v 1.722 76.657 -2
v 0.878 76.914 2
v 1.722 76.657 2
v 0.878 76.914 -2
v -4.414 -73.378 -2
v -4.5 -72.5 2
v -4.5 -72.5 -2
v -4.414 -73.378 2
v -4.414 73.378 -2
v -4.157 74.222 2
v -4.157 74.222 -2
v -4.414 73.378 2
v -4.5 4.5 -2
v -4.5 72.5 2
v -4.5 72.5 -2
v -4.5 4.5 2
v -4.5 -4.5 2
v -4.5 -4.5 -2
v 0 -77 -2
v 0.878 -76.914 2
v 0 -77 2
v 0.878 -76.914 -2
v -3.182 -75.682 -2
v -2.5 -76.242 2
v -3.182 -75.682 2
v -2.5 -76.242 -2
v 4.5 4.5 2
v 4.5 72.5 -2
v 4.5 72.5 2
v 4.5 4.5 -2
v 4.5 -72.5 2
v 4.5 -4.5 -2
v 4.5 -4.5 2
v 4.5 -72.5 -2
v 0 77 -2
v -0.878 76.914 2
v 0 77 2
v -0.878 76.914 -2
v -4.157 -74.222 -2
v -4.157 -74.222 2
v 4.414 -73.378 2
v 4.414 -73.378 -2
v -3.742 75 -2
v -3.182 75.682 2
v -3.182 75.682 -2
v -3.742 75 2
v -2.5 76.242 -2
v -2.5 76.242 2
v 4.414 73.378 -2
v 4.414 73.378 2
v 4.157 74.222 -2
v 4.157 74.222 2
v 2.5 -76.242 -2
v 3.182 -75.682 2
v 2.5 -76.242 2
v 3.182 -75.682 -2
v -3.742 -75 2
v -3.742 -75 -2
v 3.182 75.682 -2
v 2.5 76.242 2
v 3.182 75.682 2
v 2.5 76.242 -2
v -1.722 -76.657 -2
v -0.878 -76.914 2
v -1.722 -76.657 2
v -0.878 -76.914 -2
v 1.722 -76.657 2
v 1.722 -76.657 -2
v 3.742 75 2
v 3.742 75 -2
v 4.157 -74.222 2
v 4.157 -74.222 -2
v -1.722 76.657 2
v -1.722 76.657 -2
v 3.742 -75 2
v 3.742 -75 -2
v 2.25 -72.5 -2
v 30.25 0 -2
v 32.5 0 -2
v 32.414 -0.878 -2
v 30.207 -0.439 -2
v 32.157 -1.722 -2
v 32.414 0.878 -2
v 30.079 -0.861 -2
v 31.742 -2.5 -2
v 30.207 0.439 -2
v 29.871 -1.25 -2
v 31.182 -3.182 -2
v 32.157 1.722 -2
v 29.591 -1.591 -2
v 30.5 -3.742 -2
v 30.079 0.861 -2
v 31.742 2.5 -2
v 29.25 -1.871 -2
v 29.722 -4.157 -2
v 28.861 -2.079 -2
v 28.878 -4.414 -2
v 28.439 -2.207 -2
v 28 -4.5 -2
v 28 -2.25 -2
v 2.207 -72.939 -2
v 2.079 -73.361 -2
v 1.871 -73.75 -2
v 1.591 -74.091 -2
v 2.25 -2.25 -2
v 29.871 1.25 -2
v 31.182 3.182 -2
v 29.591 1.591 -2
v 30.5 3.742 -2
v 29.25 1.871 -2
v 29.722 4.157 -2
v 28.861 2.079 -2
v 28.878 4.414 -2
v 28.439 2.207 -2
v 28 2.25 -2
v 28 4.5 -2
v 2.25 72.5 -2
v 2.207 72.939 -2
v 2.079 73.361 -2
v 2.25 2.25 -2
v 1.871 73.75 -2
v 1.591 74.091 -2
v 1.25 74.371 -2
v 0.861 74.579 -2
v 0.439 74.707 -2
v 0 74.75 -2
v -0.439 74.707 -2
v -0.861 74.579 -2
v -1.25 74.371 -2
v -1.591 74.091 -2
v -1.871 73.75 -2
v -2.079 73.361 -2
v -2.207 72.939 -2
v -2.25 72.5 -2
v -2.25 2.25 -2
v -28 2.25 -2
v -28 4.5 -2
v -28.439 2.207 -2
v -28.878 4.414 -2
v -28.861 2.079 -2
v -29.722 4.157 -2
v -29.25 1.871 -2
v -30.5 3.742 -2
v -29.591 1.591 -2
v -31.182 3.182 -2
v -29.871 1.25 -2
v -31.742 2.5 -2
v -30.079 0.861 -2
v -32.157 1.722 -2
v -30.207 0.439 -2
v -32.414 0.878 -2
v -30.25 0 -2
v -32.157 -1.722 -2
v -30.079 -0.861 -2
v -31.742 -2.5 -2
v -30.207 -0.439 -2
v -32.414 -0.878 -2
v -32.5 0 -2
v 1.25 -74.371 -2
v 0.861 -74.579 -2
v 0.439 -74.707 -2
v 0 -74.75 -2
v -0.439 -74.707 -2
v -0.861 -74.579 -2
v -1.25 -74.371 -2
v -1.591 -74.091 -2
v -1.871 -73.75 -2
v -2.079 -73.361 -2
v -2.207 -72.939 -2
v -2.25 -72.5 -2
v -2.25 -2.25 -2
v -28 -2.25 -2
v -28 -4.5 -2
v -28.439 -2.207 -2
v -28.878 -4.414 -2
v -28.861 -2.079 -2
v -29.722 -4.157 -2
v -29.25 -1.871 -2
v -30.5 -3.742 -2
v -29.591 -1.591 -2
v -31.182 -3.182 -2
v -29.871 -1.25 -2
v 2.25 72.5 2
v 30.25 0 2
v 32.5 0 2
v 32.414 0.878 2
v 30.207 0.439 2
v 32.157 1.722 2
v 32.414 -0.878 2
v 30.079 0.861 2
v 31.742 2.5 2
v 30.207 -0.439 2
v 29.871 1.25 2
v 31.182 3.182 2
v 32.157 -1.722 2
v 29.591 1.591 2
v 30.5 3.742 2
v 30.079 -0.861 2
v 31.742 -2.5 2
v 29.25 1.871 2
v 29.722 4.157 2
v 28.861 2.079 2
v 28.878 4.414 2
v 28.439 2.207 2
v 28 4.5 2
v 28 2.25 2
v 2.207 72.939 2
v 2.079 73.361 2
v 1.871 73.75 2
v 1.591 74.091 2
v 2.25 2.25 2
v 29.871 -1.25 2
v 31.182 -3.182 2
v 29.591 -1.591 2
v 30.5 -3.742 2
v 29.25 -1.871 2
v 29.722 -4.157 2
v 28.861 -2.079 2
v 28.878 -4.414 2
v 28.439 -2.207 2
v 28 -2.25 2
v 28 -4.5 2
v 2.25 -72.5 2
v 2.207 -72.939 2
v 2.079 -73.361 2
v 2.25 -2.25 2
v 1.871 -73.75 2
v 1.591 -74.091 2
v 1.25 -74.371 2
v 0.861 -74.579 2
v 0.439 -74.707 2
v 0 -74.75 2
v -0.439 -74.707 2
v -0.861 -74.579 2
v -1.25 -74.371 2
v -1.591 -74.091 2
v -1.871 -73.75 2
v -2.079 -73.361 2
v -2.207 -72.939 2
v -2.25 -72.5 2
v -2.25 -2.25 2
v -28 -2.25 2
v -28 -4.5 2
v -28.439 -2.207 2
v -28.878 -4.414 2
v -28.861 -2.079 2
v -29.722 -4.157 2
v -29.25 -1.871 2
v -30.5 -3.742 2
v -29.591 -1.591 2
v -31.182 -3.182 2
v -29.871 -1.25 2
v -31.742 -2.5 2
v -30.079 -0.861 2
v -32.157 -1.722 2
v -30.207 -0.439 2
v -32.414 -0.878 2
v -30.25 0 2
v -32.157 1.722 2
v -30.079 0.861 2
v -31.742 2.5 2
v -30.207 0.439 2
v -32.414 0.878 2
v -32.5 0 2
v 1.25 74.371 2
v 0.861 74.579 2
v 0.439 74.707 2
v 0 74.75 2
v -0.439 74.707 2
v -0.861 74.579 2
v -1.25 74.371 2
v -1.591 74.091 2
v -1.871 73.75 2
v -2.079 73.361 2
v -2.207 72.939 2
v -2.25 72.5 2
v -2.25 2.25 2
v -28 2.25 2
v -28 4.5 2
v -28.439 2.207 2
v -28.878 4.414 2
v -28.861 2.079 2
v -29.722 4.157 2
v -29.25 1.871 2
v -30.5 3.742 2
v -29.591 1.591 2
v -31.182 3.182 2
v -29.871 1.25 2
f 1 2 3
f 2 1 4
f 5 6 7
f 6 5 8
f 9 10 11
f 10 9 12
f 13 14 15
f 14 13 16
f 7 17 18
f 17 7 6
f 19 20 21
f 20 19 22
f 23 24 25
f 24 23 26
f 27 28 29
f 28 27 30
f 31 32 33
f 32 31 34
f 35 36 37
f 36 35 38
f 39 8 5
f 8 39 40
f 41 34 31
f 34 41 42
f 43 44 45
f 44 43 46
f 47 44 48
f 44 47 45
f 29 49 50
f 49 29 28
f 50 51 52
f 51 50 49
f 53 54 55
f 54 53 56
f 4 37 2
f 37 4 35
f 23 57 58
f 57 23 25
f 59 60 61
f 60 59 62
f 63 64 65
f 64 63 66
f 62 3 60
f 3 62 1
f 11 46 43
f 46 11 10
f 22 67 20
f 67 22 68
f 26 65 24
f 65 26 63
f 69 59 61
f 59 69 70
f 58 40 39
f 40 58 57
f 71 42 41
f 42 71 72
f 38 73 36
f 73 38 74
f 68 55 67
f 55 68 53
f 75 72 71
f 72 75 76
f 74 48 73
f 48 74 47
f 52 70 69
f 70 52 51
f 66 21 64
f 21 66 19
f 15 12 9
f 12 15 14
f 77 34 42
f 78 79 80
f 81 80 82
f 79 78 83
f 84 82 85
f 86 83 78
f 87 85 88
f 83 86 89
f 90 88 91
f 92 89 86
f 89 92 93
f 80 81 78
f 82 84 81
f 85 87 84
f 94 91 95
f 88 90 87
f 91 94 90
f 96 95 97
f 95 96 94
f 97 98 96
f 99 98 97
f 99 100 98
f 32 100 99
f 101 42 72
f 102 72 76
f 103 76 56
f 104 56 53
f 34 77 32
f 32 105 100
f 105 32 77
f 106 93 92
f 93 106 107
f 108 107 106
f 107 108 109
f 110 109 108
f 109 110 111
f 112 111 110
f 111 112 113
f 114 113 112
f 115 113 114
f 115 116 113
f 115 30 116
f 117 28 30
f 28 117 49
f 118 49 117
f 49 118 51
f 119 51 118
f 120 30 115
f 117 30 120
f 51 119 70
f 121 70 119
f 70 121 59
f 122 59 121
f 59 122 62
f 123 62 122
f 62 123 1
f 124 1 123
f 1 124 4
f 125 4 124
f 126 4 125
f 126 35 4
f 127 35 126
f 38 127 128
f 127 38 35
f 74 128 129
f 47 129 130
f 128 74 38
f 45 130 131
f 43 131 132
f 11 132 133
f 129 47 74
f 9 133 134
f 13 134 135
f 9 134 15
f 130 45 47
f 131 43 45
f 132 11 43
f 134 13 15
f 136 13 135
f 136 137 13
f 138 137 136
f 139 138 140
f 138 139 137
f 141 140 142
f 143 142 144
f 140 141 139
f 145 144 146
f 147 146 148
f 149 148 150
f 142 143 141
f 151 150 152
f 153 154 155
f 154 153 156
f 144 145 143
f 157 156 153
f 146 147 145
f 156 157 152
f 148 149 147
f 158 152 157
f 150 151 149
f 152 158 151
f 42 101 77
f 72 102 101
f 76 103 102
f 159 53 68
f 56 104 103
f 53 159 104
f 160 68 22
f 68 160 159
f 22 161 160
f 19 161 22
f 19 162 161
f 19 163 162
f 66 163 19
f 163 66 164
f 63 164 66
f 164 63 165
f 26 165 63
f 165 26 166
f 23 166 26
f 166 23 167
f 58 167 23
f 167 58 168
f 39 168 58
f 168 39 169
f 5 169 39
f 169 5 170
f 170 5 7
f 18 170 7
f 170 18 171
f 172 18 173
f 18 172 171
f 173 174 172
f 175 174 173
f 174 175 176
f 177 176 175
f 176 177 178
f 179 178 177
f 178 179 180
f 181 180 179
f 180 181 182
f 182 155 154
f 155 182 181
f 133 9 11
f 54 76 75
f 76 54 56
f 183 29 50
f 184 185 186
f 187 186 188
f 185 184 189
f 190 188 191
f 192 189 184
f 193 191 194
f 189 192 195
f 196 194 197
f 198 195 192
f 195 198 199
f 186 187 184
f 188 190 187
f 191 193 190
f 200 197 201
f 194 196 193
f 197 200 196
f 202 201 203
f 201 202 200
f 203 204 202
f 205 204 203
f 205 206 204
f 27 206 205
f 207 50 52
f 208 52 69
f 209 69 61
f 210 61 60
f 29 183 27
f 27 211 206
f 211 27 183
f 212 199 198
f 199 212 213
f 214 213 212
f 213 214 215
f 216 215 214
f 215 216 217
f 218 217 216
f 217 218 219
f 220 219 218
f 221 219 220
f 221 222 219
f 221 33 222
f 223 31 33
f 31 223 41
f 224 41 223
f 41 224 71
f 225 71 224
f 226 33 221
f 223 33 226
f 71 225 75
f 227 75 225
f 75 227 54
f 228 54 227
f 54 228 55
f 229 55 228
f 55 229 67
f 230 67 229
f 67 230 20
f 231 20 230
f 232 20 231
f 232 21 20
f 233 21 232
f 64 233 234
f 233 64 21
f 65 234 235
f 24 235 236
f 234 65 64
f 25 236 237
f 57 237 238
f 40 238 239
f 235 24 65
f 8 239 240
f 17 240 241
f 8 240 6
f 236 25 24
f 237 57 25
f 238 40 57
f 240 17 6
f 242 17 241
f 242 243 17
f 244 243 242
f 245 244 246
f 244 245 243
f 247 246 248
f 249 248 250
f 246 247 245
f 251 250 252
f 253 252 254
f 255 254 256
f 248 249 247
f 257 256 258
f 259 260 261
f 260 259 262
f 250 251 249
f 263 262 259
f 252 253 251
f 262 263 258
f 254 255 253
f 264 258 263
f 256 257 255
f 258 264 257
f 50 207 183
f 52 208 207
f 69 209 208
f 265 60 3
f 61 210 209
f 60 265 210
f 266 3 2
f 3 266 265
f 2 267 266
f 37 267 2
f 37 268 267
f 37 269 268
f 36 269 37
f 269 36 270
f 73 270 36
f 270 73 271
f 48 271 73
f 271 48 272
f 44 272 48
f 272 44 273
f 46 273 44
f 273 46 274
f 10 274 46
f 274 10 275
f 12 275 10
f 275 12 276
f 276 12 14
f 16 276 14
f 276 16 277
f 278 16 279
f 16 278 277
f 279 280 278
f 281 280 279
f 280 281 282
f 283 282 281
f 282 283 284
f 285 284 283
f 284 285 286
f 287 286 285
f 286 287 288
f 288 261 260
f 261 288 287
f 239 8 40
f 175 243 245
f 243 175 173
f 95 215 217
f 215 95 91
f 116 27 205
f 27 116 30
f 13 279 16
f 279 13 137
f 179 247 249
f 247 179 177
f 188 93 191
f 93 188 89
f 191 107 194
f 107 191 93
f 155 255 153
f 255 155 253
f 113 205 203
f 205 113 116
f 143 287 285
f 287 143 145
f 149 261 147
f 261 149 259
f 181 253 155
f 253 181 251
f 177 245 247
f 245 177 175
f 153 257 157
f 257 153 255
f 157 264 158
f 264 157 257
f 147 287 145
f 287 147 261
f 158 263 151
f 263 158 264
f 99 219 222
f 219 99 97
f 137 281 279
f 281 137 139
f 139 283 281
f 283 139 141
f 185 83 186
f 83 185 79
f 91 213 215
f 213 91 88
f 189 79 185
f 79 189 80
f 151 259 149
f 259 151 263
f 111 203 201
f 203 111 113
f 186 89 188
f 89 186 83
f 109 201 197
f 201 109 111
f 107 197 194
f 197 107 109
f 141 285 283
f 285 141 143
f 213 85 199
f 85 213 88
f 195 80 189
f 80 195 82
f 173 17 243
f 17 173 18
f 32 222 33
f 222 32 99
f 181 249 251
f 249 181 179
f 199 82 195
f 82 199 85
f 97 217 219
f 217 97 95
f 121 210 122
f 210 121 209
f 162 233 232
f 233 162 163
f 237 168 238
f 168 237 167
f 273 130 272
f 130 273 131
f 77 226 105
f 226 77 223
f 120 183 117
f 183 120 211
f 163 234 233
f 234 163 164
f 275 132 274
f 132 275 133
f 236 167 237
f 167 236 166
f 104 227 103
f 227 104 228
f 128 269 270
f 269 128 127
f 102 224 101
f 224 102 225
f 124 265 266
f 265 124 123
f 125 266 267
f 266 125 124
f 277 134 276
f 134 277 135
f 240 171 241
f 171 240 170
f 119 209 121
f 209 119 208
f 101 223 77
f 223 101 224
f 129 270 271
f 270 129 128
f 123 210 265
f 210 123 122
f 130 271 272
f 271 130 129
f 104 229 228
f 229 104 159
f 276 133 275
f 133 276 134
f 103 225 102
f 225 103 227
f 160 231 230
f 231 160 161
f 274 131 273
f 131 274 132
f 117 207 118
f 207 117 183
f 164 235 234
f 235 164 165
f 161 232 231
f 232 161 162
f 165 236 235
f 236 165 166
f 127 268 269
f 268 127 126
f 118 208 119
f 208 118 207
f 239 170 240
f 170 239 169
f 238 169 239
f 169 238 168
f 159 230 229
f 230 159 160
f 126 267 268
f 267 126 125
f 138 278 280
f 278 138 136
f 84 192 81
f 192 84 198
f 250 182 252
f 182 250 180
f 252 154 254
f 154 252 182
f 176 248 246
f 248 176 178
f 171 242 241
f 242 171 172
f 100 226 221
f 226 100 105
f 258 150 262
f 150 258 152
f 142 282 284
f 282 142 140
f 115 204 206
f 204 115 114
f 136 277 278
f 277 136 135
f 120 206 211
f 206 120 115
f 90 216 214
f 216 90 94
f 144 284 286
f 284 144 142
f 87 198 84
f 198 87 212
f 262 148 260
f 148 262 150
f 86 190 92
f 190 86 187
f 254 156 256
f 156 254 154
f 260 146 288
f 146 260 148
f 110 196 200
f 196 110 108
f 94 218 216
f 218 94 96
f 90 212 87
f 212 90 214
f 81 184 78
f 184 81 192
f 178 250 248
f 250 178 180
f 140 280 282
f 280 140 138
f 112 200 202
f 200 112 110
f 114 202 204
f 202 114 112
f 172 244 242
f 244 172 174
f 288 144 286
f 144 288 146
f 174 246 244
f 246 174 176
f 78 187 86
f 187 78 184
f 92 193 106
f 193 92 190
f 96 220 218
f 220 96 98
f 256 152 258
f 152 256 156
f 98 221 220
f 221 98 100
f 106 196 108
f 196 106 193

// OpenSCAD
len_phone = 145;
d_screw_m4= 4.5;
width_phone = 56;
thickness_holder = 4;
holder_set();
module holder_set() {
difference() {
    t_cross();
    screw_hole();
}
}
module t_cross(){
    hull() {
        translate([0, -len_phone/2, 0])
        cylinder(d=9, h=thickness_holder, center=true, $fn=32);
        translate([0, len_phone/2, 0])
        cylinder(d=9, h=thickness_holder, center=true, $fn=32);
        }
    hull() {
        translate([width_phone/2, 0, 0])
        cylinder(d=9, h=thickness_holder, center=true, $fn=32);
        translate([-width_phone/2, 0, 0])
        cylinder(d=9, h=thickness_holder, center=true, $fn=32);   
    }
}

    module screw_hole() {

    color("red")
    hull() {
        translate([0, -len_phone/2, 0])
        cylinder(d=d_screw_m4, h=6, center=true, $fn=32);
        translate([0, len_phone/2, 0])
        cylinder(d=d_screw_m4, h=6, center=true, $fn=32);
        }
        color("red")
    hull() {
        translate([width_phone/2, 0, 0])
        cylinder(d=d_screw_m4, h=6, center=true, $fn=32);
        translate([-width_phone/2, 0, 0])
        cylinder(d=d_screw_m4, h=6, center=true, $fn=32);   
        }
    }
